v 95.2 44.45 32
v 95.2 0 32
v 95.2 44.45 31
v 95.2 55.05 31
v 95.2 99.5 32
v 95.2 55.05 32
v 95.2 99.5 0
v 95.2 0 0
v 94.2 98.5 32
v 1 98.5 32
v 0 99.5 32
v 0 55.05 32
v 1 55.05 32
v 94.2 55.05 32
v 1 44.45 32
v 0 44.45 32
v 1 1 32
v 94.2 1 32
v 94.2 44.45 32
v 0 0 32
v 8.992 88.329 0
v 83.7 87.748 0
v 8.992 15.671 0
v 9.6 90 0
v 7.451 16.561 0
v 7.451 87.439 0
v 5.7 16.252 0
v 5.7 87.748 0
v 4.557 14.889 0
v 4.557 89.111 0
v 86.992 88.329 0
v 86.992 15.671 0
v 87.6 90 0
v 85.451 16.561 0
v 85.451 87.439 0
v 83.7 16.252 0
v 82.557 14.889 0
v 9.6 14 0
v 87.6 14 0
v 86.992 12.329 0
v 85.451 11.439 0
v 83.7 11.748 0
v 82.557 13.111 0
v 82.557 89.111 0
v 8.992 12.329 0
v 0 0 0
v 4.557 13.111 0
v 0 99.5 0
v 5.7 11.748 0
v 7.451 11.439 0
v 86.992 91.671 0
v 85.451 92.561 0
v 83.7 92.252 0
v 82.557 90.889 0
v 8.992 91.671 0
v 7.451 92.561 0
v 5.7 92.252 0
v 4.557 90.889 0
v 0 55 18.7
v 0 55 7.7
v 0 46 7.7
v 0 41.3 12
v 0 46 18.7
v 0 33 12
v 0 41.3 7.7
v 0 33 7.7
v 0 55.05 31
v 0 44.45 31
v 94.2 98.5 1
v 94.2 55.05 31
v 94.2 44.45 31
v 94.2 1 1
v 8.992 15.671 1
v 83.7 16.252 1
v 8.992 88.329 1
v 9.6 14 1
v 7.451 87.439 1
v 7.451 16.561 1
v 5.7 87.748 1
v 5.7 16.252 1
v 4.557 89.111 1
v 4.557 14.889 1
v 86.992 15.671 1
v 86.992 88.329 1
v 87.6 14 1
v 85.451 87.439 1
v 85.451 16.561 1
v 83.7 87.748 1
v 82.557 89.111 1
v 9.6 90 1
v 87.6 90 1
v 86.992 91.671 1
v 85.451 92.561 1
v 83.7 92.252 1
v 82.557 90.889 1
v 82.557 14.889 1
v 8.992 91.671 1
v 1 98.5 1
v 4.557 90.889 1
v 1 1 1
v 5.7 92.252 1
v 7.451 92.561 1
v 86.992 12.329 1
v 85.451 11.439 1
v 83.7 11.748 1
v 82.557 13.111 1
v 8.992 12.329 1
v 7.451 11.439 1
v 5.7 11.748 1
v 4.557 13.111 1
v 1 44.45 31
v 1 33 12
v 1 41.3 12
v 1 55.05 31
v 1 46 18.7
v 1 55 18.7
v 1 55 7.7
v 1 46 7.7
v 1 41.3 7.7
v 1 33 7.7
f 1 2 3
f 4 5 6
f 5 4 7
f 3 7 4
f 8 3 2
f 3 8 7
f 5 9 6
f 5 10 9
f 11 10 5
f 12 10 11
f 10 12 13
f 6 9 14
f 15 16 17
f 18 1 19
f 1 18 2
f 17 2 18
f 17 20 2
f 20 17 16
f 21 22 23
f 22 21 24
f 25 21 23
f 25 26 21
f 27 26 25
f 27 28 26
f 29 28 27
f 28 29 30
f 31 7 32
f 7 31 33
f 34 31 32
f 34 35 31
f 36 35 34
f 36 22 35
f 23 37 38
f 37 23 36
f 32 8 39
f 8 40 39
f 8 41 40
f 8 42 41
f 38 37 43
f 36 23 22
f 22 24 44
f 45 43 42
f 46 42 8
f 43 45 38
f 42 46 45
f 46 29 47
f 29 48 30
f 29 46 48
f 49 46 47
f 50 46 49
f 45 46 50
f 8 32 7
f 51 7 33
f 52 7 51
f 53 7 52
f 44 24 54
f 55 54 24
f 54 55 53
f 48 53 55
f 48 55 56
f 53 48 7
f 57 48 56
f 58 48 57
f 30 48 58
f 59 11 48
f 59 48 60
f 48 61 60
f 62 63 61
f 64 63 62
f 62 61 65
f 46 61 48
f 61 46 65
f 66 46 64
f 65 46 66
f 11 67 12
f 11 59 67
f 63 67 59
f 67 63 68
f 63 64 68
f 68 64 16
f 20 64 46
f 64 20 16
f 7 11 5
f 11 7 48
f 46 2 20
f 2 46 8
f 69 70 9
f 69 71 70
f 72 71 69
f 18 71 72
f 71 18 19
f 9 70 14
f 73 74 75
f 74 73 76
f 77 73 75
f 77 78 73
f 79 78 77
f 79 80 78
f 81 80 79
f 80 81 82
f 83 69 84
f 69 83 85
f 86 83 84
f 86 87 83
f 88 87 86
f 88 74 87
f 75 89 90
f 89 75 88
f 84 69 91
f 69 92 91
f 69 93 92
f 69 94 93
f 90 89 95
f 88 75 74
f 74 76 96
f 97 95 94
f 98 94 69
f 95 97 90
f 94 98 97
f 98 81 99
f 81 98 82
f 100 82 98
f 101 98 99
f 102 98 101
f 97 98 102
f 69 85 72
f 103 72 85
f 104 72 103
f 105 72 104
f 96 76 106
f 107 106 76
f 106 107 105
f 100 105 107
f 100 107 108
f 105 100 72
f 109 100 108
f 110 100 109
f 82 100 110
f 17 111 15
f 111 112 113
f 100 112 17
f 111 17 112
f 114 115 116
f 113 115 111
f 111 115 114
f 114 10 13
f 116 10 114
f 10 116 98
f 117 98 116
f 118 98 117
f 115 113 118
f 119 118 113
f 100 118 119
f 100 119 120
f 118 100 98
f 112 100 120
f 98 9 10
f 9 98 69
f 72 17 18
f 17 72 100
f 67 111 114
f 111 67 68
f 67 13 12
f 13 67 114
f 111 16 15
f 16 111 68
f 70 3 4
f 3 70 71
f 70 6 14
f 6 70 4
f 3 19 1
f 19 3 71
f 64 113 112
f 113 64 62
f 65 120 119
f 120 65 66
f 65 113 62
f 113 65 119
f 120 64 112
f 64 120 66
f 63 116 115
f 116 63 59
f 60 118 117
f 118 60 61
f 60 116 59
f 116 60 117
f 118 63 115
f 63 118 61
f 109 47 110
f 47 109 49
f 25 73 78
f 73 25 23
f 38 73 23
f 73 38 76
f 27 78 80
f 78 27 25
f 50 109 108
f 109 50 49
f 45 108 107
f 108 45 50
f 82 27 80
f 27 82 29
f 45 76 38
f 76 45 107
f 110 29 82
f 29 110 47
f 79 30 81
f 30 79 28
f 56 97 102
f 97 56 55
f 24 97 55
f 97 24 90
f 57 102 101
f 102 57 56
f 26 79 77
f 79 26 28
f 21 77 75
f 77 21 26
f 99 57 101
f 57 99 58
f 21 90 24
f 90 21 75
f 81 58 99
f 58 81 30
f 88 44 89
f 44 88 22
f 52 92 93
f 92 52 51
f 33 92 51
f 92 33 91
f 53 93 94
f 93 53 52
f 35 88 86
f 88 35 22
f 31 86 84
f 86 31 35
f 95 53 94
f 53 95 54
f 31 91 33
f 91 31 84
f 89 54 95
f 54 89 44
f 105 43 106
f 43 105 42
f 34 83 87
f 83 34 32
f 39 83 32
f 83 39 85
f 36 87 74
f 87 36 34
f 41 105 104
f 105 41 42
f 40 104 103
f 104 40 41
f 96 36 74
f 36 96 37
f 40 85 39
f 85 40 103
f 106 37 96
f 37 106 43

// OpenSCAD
difference(){
difference(){
difference(){
translate([47.6, 49.75, 16.0]) cube([95.2, 99.5, 32.0], center = true);
translate([47.6, 49.75, 16.5]) cube([93.2, 97.5, 31.0], center = true);
}
union() {
translate([0.5, 49.75, 31.5]) cube([1.0, 10.6, 1.0], center = true);
translate([94.7, 49.75, 31.5]) cube([1.0, 10.6, 1.0], center = true);
}
}
union() {
union() {
translate([0.5, 37.15, 9.85]) cube([1.0, 8.3, 4.3], center = true);
translate([0.5, 50.5, 13.2]) cube([1.0, 9.0, 11.0], center = true);
}
union() {
translate([7.0, 14.0, 0.5]) cylinder(h = 1.0, r = 2.6, center = true);
translate([7.0, 90.0, 0.5]) cylinder(h = 1.0, r = 2.6, center = true);
translate([85.0, 90.0, 0.5]) cylinder(h = 1.0, r = 2.6, center = true);
translate([85.0, 14.0, 0.5]) cylinder(h = 1.0, r = 2.6, center = true);
}
}
}
